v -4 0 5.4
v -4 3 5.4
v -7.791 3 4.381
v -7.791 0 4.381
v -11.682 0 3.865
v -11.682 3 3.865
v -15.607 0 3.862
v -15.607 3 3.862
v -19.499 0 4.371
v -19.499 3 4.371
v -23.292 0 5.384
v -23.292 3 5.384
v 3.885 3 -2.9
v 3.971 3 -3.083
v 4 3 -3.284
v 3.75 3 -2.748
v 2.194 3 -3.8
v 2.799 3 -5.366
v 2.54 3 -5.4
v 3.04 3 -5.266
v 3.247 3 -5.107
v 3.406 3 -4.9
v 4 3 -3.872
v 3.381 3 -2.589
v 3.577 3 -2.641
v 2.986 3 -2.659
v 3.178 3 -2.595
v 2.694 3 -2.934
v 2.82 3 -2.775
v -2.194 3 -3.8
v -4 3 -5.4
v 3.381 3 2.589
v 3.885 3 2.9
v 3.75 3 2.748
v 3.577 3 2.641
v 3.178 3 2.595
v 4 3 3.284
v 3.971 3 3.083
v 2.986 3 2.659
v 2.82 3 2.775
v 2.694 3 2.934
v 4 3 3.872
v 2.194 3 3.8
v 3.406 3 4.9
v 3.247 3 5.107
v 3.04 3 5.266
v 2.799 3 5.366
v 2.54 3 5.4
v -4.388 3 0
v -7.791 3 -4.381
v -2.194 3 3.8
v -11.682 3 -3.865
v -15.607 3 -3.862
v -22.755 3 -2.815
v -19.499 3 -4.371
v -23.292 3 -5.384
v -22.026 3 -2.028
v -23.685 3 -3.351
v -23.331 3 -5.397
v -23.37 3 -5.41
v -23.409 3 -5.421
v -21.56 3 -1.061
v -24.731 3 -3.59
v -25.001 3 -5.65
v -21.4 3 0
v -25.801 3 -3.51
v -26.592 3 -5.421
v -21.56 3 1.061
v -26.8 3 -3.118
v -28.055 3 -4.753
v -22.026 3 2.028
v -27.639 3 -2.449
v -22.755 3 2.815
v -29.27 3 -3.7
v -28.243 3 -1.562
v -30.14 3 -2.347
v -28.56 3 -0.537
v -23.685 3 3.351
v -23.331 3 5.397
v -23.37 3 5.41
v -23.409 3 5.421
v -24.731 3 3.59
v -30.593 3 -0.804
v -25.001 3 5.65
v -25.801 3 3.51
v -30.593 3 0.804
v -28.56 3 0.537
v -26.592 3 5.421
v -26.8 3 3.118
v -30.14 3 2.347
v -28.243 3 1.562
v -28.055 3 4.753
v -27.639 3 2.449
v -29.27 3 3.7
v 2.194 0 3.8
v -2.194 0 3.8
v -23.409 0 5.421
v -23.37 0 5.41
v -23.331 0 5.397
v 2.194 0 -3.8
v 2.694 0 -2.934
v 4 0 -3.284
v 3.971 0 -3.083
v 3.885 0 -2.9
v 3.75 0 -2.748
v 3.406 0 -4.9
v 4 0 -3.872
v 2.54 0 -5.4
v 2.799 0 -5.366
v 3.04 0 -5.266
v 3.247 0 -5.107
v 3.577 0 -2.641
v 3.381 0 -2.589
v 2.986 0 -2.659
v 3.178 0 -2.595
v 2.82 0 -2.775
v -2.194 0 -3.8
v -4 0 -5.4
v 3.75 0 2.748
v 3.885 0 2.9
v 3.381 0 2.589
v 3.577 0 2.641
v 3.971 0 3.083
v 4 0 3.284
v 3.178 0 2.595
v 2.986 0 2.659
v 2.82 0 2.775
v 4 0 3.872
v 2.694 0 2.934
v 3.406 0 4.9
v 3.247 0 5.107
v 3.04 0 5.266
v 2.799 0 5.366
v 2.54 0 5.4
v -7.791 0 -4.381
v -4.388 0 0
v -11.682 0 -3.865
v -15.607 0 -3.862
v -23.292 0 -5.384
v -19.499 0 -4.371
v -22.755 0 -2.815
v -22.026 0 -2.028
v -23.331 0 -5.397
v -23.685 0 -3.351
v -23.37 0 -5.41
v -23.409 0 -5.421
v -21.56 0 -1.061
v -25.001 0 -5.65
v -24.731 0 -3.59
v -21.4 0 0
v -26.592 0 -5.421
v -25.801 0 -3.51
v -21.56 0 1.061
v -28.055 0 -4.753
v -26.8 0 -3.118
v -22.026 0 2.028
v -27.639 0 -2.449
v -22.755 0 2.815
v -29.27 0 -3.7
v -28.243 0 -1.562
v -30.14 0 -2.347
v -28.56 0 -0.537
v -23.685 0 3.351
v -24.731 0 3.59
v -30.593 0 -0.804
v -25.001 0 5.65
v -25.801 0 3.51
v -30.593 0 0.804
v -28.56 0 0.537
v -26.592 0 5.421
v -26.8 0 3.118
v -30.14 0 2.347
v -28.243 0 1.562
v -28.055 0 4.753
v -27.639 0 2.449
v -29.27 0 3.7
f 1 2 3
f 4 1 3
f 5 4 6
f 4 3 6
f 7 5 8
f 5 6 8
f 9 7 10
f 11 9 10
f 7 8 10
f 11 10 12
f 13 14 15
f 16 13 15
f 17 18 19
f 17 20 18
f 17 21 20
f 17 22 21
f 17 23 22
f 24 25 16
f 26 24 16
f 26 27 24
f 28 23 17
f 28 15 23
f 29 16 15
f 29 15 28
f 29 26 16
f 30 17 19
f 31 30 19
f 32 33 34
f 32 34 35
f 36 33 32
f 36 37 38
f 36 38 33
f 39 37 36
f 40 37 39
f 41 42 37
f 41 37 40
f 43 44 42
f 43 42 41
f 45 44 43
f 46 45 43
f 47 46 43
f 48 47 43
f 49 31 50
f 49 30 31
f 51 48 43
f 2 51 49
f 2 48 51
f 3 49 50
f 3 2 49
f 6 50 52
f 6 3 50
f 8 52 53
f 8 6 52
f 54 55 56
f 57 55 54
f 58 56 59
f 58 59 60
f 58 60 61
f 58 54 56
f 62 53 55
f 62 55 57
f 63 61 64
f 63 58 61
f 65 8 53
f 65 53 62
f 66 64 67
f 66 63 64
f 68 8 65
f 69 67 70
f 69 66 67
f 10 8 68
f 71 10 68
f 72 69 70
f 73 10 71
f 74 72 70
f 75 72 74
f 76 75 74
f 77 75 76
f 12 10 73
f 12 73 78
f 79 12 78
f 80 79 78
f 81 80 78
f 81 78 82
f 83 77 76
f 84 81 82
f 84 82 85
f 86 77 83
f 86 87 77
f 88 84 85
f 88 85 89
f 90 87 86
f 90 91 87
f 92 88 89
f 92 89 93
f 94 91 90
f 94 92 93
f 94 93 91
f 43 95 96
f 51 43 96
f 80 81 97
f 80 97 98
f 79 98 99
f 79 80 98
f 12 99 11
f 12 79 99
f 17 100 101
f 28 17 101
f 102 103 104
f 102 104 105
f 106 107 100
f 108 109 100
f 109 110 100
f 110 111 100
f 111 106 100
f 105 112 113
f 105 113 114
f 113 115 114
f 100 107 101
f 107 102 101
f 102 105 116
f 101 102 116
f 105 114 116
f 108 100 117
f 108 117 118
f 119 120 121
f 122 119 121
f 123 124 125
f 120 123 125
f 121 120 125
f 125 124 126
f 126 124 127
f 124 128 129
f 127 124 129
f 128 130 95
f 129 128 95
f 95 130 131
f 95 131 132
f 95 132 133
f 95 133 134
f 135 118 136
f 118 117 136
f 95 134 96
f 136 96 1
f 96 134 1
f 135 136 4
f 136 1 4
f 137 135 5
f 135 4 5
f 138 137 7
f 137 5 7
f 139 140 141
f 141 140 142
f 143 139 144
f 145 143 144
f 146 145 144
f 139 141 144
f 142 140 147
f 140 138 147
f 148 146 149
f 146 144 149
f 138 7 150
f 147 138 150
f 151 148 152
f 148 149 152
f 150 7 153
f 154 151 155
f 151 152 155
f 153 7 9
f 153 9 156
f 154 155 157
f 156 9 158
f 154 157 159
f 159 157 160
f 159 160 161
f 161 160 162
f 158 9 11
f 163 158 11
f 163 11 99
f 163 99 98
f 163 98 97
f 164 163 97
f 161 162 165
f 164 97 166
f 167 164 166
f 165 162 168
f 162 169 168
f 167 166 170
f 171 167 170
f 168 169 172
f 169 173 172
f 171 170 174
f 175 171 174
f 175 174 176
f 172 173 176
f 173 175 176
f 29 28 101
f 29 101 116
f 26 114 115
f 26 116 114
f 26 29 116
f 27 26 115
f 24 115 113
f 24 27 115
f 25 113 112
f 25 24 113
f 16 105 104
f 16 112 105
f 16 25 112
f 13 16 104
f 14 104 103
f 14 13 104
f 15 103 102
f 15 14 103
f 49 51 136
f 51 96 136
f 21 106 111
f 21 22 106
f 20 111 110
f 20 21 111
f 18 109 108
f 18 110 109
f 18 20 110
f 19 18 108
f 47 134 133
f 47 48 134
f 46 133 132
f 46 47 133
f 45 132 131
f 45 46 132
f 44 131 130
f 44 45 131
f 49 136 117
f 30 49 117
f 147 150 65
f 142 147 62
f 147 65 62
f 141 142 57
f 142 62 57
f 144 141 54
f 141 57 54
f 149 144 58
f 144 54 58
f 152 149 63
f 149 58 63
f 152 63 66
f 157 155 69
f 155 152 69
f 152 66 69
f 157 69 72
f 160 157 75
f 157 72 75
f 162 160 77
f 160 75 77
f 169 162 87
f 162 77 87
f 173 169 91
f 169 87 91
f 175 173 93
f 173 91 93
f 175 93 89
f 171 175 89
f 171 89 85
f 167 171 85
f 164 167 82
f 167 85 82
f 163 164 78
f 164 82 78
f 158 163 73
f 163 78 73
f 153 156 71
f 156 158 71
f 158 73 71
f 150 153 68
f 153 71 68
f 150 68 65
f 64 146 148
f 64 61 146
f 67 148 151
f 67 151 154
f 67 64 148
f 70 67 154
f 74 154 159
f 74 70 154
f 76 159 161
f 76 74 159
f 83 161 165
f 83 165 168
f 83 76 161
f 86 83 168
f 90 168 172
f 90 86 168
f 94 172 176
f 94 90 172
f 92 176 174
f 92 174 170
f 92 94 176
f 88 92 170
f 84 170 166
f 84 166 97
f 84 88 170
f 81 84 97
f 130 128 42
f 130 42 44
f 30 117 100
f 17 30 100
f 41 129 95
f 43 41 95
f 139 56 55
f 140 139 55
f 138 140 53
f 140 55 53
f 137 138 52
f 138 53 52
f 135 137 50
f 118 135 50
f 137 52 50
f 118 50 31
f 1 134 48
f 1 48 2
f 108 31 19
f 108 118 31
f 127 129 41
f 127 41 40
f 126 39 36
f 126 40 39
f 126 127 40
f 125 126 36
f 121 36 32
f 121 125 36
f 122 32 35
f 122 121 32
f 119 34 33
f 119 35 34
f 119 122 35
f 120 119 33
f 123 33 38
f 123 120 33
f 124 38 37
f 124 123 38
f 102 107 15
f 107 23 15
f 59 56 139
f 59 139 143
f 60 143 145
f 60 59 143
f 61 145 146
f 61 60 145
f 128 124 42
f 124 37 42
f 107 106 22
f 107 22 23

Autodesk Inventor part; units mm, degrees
ref_plane "YZ Plane" through (0, 0, 0) normal (1, 0, 0) x (0, 1, 0)
ref_plane "XZ Plane" through (0, 0, 0) normal (0, 1, 0) x (-1, 0, 0)
ref_plane "XY Plane" through (0, 0, 0) normal (0, 0, 1) x (1, 0, 0)
sketch "Boceto1" plane through (0, 0, 0) normal (0, 1, 0) x (-1, 0, 0)
  line L0 (6.2354, 0) -> (3.1177, -5.4)
  line L1 (3.1177, -5.4) -> (-3.1177, -5.4)
  line L2 (-3.1177, -5.4) -> (-6.2354, 0)
  line L3 (-6.2354, 0) -> (-3.1177, 5.4)
  line L4 (-3.1177, 5.4) -> (3.1177, 5.4)
  line L5 (3.1177, 5.4) -> (6.2354, 0)
  circle A0 centre (0, 0) radius 5.4
  line L6 (4.3879, 0) -> (2.1939, -3.8)
  line L7 (2.1939, -3.8) -> (-2.1939, -3.8)
  line L8 (-2.1939, -3.8) -> (-4.3879, 0)
  line L9 (-4.3879, 0) -> (-2.1939, 3.8)
  line L10 (-2.1939, 3.8) -> (2.1939, 3.8)
  line L11 (2.1939, 3.8) -> (4.3879, 0)
  dimension "d0" = 10.8
  dimension "d4" = 1.6
extrude "Extrusión1" add sketch "Boceto1" along normal blind 3
sketch "Boceto2" plane through (0, 3, 0) normal (0, 1, 0) x (1, 0, 0)
  line L0 (8.9124, 8.7156) -> (4, 8.7156)
  line L1 (4, 8.7156) -> (4, -10.3861)
  line L2 (4, -10.3861) -> (8.9124, -10.3861)
  line L3 (8.9124, -10.3861) -> (8.9124, 8.7156)
  point P0 (0, 0)
  dimension "d22" = 4
extrude "Extrusión2" cut sketch "Boceto2" against normal through all
fillet "Empalme1" radius 1 4 edges at (3.1177, 1.5, -5.4) (3.1177, 1.5, 5.4) (-3.1177, 1.5, 5.4) (-3.1177, 1.5, -5.4)
fillet "Empalme2" radius 0.7 2 edges at (4, 1.5, -0.6718) (4, 1.5, 0.6718)
sketch "Boceto3" plane through (0, 3, 0) normal (0, 1, 0) x (1, 0, 0)
  line L0 (-23.3379, 5.4) -> (-4.3879, 5.4)
  line L1 (-4.3879, 5.4) -> (-4.3879, -5.4)
  line L2 (-4.3879, -5.4) -> (-23.3379, -5.4)
  line L3 (-23.3379, -5.4) -> (-23.3379, 5.4)
  line L4 (-23.3379, 5.4) -> (-4.3879, -5.4) construction
  line L5 (-4.3879, 5.4) -> (-23.3379, -5.4) construction
  line L6 (2.6938, -2.9342) -> (2.1939, -3.8) projected
  line L7 (2.1939, -3.8) -> (-2.1939, -3.8) projected
  line L8 (-2.1939, -3.8) -> (-4.3879, 0) projected
  line L9 (-4.3879, 0) -> (-2.1939, 3.8) projected
  line L10 (-2.1939, 3.8) -> (2.1939, 3.8) projected
  line L11 (2.1939, 3.8) -> (2.6938, 2.9342) projected
  arc A0 (3.4064, 4.9) -> (2.5403, 5.4) centre (2.5403, 4.4) ccw projected
  line L12 (2.5403, 5.4) -> (-2.5403, 5.4) projected
  arc A1 (-2.5403, 5.4) -> (-3.4064, 4.9) centre (-2.5403, 4.4) ccw projected
  line L13 (-3.4064, 4.9) -> (-6.2354, 0) projected
  line L14 (-6.2354, 0) -> (-3.4064, -4.9) projected
  arc A2 (-3.4064, -4.9) -> (-2.5403, -5.4) centre (-2.5403, -4.4) ccw projected
  line L15 (-2.5403, -5.4) -> (2.5403, -5.4) projected
  arc A3 (2.5403, -5.4) -> (3.4064, -4.9) centre (2.5403, -4.4) ccw projected
  line L16 (-4.3879, 5.4) -> (-0.8083, 5.4)
  line L17 (-0.8083, 5.4) -> (-0.8083, -5.4)
  line L18 (-0.8083, -5.4) -> (-4.3879, -5.4)
  line L19 (-4.3879, -5.4) -> (-4.3879, 5.4)
  circle A4 centre (-25, 0) radius 3.6
  circle A5 centre (-25, 0) radius 5.65
  line L20 (3.4064, -4.9) -> (4, -3.8718) projected
  line L21 (4, 3.8718) -> (3.4064, 4.9) projected
  line L22 (4, -3.8718) -> (4, -3.2842) projected
  line L23 (4, 3.2842) -> (4, 3.8718) projected
  arc A6 (4, -3.2842) -> (2.6938, -2.9342) centre (3.3, -3.2842) ccw projected
  arc A7 (2.6938, 2.9342) -> (4, 3.2842) centre (3.3, 3.2842) ccw projected
  point P0 (0, 0)
  point P1 (-13.8629, 0)
  point P2 (-13.8629, 0)
  point P3 (-13.8629, 0)
  point P4 (-2.5403, -5.4)
  point P5 (-2.5403, 5.4)
  point P6 (-23.3379, 5.4)
  point P7 (-2.8868, 4)
  point P8 (-4.3879, 3.2)
  point P9 (-4.3879, -3.2)
  point P10 (-23.3379, 5.4)
  point P11 (-0.8083, -3.8)
  point P12 (-0.8083, 3.8)
  point P13 (-0.8083, 5.4)
  dimension "d12" = 11.3
  dimension "d10" = 25
  dimension "d11" = 7.2
extrude "Extrusión3" add sketch "Boceto3" against normal up to surface (3 mm away) contours A5 L3 A4 | L0 L1 L13 L14 L2 A5 | L3 A4 A5 | L16 A1 L13 L1 | L1 L14 A2 L18
sketch "Boceto4" plane through (0, 3, 0) normal (0, 1, 0) x (1, 0, 0)
  arc A0 (-23.3379, 5.4) -> (-4, 5.4) centre (-13.669, 33.7991) ccw
  line L0 (-23.3379, -5.4) -> (2.5403, -5.4) projected
  arc A1 (-4, -5.4) -> (-23.3379, -5.4) centre (-13.669, -33.7991) ccw
  circle A2 centre (-25, 0) radius 3.6 projected
  line L1 (2.6938, -2.9342) -> (2.1939, -3.8) projected
  line L2 (2.1939, -3.8) -> (-2.1939, -3.8) projected
  line L3 (-2.1939, -3.8) -> (-4.3879, 0) projected
  line L4 (-4.3879, 0) -> (-2.1939, 3.8) projected
  line L5 (-2.1939, 3.8) -> (2.1939, 3.8) projected
  line L6 (2.1939, 3.8) -> (2.6938, 2.9342) projected
  arc A3 (3.4064, 4.9) -> (2.5403, 5.4) centre (2.5403, 4.4) ccw projected
  line L7 (2.5403, 5.4) -> (-23.3379, 5.4) projected
  arc A4 (-23.3379, 5.4) -> (-23.3379, -5.4) centre (-25, 0) ccw projected
  line L8 (-23.3379, -5.4) -> (2.5403, -5.4) projected
  arc A5 (2.5403, -5.4) -> (3.4064, -4.9) centre (2.5403, -4.4) ccw projected
  line L9 (3.4064, -4.9) -> (4, -3.8718) projected
  line L10 (4, 3.8718) -> (3.4064, 4.9) projected
  line L11 (4, 3.2842) -> (4, 3.8718) projected
  line L12 (4, -3.8718) -> (4, -3.2842) projected
  arc A6 (4, -3.2842) -> (2.6938, -2.9342) centre (3.3, -3.2842) ccw projected
  arc A7 (2.6938, 2.9342) -> (4, 3.2842) centre (3.3, 3.2842) ccw projected
  line L13 (2.5403, 5.4) -> (-23.3379, 5.4) projected
  point P0 (0, 0)
  point P1 (-4, 5.4)
  dimension "d16" = 4
  dimension "d18" = 30
extrude "Extrusión4" cut sketch "Boceto4" against normal through all contours L7 A0 | A1 L0
fillet "Empalme4" radius 3 2 edges at (-23.3379, 1.5, -5.4) (-23.3379, 1.5, 5.4)
properties part number "ShortLink"
